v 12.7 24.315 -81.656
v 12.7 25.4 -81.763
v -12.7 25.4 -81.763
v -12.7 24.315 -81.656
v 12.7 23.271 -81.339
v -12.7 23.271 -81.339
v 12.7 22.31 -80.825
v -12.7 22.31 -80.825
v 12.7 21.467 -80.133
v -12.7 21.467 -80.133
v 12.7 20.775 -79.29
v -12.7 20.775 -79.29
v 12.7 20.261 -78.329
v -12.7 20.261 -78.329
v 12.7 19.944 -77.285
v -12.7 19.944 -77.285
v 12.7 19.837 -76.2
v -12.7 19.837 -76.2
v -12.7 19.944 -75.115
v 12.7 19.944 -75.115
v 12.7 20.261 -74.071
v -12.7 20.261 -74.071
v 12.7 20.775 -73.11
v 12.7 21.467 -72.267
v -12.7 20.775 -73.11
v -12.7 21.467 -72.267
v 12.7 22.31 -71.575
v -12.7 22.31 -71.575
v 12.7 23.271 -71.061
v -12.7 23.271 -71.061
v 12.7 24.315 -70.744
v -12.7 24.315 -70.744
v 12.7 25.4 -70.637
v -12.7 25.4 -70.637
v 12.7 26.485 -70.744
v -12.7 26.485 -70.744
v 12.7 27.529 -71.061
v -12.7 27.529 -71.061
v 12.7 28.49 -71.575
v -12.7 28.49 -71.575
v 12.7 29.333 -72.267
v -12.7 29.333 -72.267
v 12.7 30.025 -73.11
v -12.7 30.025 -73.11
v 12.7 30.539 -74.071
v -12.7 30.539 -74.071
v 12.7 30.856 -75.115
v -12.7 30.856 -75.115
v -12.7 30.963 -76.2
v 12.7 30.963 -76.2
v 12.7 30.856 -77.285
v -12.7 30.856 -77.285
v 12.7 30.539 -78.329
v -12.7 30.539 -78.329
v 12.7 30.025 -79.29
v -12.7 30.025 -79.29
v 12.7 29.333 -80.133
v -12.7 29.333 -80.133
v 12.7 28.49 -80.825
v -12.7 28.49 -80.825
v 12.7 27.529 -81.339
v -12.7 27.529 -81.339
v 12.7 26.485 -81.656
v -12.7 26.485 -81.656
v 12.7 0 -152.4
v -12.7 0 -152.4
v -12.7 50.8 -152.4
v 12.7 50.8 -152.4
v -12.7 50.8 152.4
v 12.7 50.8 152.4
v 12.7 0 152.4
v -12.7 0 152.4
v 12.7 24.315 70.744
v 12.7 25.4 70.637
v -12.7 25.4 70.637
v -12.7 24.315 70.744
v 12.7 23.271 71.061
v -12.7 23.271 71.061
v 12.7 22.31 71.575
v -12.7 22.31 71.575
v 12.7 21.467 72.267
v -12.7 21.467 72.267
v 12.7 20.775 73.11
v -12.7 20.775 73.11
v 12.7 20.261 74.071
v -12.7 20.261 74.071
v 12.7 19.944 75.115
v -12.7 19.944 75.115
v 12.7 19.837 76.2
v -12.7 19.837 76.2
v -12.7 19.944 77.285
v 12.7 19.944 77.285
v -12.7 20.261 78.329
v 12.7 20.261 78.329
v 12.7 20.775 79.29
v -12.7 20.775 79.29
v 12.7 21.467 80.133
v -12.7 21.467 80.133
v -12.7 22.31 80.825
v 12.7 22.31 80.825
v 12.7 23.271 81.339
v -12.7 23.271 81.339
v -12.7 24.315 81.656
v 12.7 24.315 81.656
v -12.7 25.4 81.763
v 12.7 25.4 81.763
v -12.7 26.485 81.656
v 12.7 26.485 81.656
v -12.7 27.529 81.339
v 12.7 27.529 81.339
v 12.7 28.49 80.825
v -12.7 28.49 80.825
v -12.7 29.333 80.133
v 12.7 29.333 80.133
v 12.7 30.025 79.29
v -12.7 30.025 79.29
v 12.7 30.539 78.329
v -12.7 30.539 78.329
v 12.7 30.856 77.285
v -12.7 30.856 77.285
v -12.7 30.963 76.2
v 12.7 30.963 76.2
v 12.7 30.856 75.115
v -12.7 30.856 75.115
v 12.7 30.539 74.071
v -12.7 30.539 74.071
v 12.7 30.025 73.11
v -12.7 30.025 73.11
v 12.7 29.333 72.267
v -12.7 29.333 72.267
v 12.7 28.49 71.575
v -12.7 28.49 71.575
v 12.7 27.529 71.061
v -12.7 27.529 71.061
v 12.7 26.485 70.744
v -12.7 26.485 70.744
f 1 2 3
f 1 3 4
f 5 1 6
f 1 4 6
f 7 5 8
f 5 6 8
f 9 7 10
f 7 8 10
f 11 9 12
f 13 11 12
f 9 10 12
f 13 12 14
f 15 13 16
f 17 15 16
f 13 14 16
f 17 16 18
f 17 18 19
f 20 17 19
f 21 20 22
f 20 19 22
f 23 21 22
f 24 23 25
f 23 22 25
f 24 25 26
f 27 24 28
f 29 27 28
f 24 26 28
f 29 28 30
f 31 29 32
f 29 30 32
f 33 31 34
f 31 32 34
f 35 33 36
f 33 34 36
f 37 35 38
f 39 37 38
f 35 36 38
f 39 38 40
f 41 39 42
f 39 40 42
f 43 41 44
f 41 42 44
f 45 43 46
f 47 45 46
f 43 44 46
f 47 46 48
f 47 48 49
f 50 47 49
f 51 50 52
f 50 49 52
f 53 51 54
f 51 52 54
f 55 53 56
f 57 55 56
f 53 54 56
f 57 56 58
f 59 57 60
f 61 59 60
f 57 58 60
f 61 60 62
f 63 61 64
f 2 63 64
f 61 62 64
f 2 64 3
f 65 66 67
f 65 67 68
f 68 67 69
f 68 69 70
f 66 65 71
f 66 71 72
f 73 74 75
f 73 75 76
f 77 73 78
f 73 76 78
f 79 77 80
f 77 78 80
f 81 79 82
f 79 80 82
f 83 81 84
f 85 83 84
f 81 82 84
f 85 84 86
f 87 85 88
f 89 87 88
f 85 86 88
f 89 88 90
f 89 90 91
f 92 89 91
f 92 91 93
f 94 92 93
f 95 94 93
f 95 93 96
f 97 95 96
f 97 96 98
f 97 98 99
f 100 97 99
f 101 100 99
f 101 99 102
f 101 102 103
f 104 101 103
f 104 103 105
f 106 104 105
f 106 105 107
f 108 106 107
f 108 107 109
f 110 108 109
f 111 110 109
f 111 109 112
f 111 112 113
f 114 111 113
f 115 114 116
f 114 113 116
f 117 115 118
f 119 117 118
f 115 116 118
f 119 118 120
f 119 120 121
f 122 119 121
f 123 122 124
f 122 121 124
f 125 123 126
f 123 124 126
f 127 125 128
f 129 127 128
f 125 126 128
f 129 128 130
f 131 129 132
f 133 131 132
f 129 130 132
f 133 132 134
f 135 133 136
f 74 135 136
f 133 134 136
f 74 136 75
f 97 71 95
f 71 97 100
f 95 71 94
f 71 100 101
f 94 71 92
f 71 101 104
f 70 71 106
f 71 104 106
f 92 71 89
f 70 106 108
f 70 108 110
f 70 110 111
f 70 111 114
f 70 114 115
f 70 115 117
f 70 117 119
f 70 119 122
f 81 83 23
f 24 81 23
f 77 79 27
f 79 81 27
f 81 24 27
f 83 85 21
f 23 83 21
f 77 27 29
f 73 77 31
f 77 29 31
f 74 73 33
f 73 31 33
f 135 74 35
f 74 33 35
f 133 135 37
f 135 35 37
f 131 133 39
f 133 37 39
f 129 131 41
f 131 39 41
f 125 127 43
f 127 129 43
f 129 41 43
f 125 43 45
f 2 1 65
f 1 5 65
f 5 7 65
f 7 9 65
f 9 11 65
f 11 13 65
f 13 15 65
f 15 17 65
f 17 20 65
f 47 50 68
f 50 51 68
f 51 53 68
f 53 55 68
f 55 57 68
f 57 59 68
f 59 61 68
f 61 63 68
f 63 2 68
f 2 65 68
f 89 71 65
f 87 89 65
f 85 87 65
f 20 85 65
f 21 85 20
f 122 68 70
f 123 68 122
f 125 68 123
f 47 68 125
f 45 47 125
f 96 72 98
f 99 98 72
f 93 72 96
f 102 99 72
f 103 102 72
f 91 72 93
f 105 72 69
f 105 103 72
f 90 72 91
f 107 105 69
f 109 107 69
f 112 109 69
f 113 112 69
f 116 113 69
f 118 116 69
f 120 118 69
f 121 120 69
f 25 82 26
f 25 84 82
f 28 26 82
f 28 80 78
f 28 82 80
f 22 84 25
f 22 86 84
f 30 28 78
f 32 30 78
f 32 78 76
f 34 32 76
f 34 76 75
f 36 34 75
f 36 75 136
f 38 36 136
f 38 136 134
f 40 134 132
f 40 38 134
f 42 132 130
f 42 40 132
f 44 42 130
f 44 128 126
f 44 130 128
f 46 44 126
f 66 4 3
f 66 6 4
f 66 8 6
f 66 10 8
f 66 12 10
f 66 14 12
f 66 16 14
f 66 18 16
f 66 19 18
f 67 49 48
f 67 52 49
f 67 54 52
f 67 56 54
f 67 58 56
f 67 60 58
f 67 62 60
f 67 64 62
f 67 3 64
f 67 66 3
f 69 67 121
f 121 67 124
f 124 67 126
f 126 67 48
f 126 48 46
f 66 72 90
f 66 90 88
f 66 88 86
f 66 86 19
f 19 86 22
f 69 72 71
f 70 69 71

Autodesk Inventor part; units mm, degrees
ref_plane "YZ Plane" through (0, 0, 0) normal (1, 0, 0) x (0, 1, 0)
ref_plane "XZ Plane" through (0, 0, 0) normal (0, 1, 0) x (-1, 0, 0)
ref_plane "XY Plane" through (0, 0, 0) normal (0, 0, 1) x (1, 0, 0)
sketch "Sketch2" plane through (0, 0, 0) normal (0, 0, 1) x (1, 0, 0)
  line L0 (0, 0) -> (12.7, 0)
  line L1 (12.7, 0) -> (12.7, 50.8)
  line L2 (12.7, 50.8) -> (0, 50.8)
  line L3 (0, 0) -> (0, 50.8) construction
  line L4 (0, 0) -> (-12.7, 0)
  line L5 (-12.7, 0) -> (-12.7, 50.8)
  line L6 (-12.7, 50.8) -> (0, 50.8)
  dimension "d0" = 12.7
  dimension "d1" = 50.8
extrude "Extrusion1" add sketch "Sketch2" along normal mid plane 304.8
sketch "Sketch3" plane through (12.7, 0, 152.4) normal (1, 0, 0) x (0, 0, -1)
  line L0 (0, 0) -> (0, 50.8) construction
  line L1 (0, 25.4) -> (304.8, 25.4) construction
  line L2 (304.8, 50.8) -> (304.8, 0) construction
  point P0 (152.4, 0)
  point P1 (76.2, 25.4)
  point P2 (228.6, 25.4)
  point P3 (184.7909, 73.7254)
  dimension "d4" = 76.2
  dimension "d5" = 76.2
hole "Hole1" at (12.7, 25.4, 76.2) at (12.7, 25.4, -76.2) at (12.7, 73.7254, -32.3909) direction (-1, 0, 0) diameter 6.7564 end through all counterbore diameter 11.1252 counterbore depth 34.29 clearance for "Socket Head Cap Screw" size "1/4" standard "Ansi Unified Screw Threads"
properties part number "RestForCuts"
